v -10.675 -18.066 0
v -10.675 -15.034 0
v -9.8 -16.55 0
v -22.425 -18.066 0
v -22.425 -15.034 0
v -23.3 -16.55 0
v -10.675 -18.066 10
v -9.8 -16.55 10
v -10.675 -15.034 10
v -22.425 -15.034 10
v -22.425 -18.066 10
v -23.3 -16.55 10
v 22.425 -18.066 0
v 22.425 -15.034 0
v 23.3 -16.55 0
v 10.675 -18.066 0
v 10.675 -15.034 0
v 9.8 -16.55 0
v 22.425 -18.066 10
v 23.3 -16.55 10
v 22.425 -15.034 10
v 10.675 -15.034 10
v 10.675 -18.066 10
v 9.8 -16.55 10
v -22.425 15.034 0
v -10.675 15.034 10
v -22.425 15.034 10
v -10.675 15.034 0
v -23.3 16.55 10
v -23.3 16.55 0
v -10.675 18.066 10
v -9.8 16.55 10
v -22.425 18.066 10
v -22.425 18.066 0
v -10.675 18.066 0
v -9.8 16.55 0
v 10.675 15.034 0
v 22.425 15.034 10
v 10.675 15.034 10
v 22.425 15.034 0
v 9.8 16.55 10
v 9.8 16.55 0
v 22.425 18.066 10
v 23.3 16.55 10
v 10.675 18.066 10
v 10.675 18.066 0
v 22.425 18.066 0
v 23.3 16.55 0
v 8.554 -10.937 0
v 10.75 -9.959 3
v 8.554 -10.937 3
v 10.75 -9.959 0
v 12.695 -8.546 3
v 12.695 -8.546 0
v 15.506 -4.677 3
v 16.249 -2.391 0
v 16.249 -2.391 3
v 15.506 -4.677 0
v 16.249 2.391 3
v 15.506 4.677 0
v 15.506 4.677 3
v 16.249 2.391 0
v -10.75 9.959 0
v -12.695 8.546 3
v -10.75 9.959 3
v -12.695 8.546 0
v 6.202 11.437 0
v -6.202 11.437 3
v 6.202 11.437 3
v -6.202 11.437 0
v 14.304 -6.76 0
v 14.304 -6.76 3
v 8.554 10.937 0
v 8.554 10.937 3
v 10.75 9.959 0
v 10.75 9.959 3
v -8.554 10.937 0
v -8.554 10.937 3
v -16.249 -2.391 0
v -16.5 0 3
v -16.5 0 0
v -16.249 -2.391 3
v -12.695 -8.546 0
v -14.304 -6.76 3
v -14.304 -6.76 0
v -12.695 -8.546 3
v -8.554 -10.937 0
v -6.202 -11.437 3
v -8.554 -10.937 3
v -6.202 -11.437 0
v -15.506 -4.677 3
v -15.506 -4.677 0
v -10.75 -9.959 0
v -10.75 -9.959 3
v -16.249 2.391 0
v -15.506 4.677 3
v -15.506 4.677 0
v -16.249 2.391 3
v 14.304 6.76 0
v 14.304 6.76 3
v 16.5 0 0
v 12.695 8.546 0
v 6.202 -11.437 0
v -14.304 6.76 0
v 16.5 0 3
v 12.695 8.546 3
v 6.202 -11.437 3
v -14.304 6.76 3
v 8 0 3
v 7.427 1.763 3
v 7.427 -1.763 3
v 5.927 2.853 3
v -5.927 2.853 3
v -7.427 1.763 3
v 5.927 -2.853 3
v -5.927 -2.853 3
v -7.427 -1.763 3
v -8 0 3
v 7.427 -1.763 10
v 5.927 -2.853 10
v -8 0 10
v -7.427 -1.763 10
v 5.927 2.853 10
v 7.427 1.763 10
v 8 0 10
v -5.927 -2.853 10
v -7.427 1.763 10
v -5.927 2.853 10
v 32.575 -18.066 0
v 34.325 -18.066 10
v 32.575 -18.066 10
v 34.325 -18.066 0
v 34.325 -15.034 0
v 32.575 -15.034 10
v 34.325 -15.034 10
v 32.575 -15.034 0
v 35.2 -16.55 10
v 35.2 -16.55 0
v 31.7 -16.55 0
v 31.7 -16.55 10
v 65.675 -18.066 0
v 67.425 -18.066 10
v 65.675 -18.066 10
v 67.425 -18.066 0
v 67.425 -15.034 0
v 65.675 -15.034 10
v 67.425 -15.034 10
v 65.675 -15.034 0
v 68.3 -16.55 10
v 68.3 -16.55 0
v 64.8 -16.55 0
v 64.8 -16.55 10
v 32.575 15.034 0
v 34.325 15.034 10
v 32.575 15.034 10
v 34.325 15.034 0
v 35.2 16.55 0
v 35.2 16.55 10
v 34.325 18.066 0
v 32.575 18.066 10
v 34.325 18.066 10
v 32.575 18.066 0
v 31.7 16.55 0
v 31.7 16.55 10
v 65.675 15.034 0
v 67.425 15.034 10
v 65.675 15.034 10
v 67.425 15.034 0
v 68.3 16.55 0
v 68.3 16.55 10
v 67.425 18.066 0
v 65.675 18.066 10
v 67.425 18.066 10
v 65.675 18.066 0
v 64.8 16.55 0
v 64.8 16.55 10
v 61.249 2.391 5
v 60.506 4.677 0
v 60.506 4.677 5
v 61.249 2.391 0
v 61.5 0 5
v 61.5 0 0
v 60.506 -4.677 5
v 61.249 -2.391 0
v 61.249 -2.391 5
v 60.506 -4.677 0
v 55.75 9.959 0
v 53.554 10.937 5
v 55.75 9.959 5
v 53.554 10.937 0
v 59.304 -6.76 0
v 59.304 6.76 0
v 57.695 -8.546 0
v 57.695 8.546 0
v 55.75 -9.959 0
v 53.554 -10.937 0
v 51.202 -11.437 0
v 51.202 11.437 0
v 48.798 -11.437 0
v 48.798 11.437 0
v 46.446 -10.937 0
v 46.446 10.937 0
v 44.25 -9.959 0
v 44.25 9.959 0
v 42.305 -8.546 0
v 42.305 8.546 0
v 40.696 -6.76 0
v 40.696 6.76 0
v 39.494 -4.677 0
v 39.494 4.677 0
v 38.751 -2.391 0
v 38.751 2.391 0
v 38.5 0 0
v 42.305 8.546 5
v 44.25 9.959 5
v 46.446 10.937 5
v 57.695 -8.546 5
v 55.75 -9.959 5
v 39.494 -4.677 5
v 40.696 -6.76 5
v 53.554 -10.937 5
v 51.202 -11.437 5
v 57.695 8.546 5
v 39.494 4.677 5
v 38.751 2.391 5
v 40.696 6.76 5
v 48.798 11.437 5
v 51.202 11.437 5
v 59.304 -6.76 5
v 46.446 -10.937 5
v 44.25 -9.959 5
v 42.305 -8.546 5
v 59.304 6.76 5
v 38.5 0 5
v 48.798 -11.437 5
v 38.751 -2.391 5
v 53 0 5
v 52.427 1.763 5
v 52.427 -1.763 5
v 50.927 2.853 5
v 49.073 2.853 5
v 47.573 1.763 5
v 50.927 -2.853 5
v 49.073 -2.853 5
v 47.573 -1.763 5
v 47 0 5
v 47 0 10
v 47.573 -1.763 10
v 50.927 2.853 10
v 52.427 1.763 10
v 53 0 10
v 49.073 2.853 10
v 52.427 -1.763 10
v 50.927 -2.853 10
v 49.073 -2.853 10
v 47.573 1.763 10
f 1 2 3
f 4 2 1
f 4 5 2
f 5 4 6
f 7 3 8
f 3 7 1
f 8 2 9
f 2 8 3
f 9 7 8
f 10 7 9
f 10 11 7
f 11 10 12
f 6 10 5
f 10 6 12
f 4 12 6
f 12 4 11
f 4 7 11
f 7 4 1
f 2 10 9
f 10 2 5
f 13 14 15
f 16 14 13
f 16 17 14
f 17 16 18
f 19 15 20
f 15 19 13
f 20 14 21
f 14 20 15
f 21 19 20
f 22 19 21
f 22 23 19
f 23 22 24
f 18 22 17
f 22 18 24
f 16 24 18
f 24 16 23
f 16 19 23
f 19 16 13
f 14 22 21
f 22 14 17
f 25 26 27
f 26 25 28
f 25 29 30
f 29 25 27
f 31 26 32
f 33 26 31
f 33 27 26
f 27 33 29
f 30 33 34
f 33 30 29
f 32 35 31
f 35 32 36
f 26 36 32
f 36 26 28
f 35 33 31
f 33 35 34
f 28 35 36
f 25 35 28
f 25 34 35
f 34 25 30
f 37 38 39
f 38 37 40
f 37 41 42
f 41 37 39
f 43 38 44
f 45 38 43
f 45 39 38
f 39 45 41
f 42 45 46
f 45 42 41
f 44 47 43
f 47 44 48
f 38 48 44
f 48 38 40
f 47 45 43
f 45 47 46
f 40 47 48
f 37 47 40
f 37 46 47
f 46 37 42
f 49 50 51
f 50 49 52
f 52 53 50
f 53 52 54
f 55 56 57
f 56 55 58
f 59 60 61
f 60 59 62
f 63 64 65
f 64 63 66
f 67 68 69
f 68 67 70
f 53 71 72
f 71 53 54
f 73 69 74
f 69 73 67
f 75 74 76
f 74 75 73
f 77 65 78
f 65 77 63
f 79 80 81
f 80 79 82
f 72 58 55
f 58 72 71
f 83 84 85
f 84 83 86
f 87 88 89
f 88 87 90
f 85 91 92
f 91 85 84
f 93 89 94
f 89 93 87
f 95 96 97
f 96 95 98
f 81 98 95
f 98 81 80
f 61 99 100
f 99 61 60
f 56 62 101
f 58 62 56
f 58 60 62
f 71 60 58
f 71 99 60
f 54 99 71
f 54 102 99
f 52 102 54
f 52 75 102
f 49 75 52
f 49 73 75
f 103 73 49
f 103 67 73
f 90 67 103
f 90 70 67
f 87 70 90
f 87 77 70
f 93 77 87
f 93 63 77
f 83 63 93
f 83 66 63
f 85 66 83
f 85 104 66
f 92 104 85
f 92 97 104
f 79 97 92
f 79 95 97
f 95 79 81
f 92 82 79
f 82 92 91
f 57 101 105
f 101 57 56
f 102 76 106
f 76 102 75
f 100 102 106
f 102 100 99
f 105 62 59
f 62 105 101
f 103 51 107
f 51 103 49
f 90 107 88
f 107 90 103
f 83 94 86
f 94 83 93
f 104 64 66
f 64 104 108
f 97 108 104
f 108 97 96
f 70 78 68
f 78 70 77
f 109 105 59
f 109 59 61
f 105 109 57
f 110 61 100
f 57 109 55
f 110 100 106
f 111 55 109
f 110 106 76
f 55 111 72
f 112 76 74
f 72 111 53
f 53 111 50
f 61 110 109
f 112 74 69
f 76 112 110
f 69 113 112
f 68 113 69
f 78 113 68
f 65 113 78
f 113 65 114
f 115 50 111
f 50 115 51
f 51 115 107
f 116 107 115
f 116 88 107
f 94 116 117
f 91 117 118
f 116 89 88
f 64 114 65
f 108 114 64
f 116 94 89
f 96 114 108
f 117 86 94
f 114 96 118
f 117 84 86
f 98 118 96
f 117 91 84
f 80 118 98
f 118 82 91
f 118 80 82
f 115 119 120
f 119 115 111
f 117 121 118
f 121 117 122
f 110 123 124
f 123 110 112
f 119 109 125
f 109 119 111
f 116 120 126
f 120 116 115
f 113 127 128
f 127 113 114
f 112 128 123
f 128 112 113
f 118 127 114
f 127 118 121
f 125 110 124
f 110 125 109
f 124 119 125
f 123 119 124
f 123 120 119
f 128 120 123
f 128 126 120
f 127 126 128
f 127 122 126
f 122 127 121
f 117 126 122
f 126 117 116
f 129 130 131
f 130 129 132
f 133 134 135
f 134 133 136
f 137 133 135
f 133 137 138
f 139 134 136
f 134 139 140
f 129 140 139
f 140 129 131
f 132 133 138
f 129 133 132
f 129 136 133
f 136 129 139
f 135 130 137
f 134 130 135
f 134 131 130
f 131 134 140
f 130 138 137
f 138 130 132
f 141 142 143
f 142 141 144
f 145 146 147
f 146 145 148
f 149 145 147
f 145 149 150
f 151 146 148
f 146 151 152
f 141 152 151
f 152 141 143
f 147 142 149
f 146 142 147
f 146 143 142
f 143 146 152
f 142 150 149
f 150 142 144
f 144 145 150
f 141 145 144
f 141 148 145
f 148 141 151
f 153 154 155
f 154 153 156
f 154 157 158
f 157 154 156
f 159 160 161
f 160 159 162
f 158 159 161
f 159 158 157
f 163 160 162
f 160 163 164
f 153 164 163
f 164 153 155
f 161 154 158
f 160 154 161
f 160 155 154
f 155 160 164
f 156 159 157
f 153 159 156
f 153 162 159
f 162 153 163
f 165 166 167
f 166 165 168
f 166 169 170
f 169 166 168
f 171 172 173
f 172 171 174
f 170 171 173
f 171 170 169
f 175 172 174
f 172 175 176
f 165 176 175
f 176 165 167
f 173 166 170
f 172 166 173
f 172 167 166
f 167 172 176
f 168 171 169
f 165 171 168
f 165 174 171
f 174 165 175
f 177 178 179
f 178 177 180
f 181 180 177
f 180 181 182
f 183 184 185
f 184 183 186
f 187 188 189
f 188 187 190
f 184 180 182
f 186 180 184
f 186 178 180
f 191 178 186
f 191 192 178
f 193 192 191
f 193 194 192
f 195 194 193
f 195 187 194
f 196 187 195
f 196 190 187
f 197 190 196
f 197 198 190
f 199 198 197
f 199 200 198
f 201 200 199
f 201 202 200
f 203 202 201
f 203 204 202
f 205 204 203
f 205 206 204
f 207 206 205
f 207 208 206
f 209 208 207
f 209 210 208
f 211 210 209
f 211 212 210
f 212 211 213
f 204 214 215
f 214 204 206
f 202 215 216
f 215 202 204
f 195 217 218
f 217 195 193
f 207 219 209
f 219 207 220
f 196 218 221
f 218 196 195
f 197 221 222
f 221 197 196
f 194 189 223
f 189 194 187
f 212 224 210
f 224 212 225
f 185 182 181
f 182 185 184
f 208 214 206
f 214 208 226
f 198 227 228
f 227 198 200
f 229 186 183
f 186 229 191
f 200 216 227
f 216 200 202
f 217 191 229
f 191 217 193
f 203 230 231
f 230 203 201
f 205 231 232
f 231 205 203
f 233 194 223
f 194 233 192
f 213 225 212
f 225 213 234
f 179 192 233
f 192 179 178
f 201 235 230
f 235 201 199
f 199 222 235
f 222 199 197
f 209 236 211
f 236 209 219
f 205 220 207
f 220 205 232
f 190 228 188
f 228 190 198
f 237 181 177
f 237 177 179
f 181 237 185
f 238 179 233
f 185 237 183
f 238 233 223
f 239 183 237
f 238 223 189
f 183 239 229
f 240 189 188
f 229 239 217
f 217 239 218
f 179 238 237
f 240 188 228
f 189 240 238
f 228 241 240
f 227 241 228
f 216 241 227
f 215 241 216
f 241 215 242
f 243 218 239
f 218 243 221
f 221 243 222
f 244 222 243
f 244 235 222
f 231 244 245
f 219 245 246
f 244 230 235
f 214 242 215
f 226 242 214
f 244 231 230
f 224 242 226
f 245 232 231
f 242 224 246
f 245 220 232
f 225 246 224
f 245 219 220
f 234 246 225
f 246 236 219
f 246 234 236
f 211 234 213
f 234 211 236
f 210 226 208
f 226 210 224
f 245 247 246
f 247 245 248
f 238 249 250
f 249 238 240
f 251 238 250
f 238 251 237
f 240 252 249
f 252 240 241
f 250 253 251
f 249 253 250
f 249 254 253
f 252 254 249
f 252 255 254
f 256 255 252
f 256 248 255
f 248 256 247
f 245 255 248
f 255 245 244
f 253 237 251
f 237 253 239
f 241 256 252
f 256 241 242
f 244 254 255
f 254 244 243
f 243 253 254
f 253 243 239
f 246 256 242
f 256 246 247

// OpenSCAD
m3Diam=3.5;

module nema17Mount (depth) {
	union() {
		translate([-33.1/2, -33.1/2, 0])
			cylinder (h=depth,d=m3Diam);

		translate([33.1/2, -33.1/2, 0])
			cylinder (h=depth,d=m3Diam);

		translate([-33.1/2, 33.1/2, 0])
			cylinder (h=depth,d=m3Diam);

		translate([33.1/2, 33.1/2, 0])
			cylinder (h=depth,d=m3Diam);
		cylinder(h= depth / 2, d=23);
		cylinder(h=depth, d=6);
	}
}

module slideyMount (length=10) {
	for (i=[0:$children-1]) {
		hull() {
			translate([-length/2,0,0]) children(i);
			translate([length/2,0,0]) children(i);
		}
	}
}

module slideyNema17Mount(length, depth) {
	slideyMount(length) {
		translate([-33.1/2, -33.1/2, 0])
			cylinder (h=depth,d=m3Diam);

		translate([33.1/2, -33.1/2, 0])
			cylinder (h=depth,d=m3Diam);

		translate([-33.1/2, 33.1/2, 0])
			cylinder (h=depth,d=m3Diam);

		translate([33.1/2, 33.1/2, 0])
			cylinder (h=depth,d=m3Diam);
		cylinder(h=3, d=23);
		cylinder(h=depth, d=6);
	}
}
module flatNema17Mount(){
	union() {
		translate([-33.1/2, -33.1/2])
			circle (d=m3Diam);

		translate([33.1/2, -33.1/2])
			circle (d=m3Diam);

		translate([-33.1/2, 33.1/2])
			circle (d=m3Diam);

		translate([33.1/2, 33.1/2])
			circle (d=m3Diam);
        circle (d = 23);
	}
}

module flatSlideyMount (length = 10) {
	for (i=[0:$children-1]) {
		hull() {
			translate([-length/2,0]) children(i);
			translate([length/2,0]) children(i);
		}
	}
}

module flatSlideyNema17Mount(length) {
	slideyMount(length) {
		translate([-33.1/2, -33.1/2])
			circle(d=m3Diam);

		translate([33.1/2, -33.1/2])
			circle(d=m3Diam);

		translate([-33.1/2, 33.1/2])
			circle(d=m3Diam);

		translate([33.1/2, 33.1/2, 0])
			circle(d=m3Diam);
        circle (d = 23);
	}
}
slideyNema17Mount(10,10);

translate([50,0,0]) nema17Mount(10,10);
